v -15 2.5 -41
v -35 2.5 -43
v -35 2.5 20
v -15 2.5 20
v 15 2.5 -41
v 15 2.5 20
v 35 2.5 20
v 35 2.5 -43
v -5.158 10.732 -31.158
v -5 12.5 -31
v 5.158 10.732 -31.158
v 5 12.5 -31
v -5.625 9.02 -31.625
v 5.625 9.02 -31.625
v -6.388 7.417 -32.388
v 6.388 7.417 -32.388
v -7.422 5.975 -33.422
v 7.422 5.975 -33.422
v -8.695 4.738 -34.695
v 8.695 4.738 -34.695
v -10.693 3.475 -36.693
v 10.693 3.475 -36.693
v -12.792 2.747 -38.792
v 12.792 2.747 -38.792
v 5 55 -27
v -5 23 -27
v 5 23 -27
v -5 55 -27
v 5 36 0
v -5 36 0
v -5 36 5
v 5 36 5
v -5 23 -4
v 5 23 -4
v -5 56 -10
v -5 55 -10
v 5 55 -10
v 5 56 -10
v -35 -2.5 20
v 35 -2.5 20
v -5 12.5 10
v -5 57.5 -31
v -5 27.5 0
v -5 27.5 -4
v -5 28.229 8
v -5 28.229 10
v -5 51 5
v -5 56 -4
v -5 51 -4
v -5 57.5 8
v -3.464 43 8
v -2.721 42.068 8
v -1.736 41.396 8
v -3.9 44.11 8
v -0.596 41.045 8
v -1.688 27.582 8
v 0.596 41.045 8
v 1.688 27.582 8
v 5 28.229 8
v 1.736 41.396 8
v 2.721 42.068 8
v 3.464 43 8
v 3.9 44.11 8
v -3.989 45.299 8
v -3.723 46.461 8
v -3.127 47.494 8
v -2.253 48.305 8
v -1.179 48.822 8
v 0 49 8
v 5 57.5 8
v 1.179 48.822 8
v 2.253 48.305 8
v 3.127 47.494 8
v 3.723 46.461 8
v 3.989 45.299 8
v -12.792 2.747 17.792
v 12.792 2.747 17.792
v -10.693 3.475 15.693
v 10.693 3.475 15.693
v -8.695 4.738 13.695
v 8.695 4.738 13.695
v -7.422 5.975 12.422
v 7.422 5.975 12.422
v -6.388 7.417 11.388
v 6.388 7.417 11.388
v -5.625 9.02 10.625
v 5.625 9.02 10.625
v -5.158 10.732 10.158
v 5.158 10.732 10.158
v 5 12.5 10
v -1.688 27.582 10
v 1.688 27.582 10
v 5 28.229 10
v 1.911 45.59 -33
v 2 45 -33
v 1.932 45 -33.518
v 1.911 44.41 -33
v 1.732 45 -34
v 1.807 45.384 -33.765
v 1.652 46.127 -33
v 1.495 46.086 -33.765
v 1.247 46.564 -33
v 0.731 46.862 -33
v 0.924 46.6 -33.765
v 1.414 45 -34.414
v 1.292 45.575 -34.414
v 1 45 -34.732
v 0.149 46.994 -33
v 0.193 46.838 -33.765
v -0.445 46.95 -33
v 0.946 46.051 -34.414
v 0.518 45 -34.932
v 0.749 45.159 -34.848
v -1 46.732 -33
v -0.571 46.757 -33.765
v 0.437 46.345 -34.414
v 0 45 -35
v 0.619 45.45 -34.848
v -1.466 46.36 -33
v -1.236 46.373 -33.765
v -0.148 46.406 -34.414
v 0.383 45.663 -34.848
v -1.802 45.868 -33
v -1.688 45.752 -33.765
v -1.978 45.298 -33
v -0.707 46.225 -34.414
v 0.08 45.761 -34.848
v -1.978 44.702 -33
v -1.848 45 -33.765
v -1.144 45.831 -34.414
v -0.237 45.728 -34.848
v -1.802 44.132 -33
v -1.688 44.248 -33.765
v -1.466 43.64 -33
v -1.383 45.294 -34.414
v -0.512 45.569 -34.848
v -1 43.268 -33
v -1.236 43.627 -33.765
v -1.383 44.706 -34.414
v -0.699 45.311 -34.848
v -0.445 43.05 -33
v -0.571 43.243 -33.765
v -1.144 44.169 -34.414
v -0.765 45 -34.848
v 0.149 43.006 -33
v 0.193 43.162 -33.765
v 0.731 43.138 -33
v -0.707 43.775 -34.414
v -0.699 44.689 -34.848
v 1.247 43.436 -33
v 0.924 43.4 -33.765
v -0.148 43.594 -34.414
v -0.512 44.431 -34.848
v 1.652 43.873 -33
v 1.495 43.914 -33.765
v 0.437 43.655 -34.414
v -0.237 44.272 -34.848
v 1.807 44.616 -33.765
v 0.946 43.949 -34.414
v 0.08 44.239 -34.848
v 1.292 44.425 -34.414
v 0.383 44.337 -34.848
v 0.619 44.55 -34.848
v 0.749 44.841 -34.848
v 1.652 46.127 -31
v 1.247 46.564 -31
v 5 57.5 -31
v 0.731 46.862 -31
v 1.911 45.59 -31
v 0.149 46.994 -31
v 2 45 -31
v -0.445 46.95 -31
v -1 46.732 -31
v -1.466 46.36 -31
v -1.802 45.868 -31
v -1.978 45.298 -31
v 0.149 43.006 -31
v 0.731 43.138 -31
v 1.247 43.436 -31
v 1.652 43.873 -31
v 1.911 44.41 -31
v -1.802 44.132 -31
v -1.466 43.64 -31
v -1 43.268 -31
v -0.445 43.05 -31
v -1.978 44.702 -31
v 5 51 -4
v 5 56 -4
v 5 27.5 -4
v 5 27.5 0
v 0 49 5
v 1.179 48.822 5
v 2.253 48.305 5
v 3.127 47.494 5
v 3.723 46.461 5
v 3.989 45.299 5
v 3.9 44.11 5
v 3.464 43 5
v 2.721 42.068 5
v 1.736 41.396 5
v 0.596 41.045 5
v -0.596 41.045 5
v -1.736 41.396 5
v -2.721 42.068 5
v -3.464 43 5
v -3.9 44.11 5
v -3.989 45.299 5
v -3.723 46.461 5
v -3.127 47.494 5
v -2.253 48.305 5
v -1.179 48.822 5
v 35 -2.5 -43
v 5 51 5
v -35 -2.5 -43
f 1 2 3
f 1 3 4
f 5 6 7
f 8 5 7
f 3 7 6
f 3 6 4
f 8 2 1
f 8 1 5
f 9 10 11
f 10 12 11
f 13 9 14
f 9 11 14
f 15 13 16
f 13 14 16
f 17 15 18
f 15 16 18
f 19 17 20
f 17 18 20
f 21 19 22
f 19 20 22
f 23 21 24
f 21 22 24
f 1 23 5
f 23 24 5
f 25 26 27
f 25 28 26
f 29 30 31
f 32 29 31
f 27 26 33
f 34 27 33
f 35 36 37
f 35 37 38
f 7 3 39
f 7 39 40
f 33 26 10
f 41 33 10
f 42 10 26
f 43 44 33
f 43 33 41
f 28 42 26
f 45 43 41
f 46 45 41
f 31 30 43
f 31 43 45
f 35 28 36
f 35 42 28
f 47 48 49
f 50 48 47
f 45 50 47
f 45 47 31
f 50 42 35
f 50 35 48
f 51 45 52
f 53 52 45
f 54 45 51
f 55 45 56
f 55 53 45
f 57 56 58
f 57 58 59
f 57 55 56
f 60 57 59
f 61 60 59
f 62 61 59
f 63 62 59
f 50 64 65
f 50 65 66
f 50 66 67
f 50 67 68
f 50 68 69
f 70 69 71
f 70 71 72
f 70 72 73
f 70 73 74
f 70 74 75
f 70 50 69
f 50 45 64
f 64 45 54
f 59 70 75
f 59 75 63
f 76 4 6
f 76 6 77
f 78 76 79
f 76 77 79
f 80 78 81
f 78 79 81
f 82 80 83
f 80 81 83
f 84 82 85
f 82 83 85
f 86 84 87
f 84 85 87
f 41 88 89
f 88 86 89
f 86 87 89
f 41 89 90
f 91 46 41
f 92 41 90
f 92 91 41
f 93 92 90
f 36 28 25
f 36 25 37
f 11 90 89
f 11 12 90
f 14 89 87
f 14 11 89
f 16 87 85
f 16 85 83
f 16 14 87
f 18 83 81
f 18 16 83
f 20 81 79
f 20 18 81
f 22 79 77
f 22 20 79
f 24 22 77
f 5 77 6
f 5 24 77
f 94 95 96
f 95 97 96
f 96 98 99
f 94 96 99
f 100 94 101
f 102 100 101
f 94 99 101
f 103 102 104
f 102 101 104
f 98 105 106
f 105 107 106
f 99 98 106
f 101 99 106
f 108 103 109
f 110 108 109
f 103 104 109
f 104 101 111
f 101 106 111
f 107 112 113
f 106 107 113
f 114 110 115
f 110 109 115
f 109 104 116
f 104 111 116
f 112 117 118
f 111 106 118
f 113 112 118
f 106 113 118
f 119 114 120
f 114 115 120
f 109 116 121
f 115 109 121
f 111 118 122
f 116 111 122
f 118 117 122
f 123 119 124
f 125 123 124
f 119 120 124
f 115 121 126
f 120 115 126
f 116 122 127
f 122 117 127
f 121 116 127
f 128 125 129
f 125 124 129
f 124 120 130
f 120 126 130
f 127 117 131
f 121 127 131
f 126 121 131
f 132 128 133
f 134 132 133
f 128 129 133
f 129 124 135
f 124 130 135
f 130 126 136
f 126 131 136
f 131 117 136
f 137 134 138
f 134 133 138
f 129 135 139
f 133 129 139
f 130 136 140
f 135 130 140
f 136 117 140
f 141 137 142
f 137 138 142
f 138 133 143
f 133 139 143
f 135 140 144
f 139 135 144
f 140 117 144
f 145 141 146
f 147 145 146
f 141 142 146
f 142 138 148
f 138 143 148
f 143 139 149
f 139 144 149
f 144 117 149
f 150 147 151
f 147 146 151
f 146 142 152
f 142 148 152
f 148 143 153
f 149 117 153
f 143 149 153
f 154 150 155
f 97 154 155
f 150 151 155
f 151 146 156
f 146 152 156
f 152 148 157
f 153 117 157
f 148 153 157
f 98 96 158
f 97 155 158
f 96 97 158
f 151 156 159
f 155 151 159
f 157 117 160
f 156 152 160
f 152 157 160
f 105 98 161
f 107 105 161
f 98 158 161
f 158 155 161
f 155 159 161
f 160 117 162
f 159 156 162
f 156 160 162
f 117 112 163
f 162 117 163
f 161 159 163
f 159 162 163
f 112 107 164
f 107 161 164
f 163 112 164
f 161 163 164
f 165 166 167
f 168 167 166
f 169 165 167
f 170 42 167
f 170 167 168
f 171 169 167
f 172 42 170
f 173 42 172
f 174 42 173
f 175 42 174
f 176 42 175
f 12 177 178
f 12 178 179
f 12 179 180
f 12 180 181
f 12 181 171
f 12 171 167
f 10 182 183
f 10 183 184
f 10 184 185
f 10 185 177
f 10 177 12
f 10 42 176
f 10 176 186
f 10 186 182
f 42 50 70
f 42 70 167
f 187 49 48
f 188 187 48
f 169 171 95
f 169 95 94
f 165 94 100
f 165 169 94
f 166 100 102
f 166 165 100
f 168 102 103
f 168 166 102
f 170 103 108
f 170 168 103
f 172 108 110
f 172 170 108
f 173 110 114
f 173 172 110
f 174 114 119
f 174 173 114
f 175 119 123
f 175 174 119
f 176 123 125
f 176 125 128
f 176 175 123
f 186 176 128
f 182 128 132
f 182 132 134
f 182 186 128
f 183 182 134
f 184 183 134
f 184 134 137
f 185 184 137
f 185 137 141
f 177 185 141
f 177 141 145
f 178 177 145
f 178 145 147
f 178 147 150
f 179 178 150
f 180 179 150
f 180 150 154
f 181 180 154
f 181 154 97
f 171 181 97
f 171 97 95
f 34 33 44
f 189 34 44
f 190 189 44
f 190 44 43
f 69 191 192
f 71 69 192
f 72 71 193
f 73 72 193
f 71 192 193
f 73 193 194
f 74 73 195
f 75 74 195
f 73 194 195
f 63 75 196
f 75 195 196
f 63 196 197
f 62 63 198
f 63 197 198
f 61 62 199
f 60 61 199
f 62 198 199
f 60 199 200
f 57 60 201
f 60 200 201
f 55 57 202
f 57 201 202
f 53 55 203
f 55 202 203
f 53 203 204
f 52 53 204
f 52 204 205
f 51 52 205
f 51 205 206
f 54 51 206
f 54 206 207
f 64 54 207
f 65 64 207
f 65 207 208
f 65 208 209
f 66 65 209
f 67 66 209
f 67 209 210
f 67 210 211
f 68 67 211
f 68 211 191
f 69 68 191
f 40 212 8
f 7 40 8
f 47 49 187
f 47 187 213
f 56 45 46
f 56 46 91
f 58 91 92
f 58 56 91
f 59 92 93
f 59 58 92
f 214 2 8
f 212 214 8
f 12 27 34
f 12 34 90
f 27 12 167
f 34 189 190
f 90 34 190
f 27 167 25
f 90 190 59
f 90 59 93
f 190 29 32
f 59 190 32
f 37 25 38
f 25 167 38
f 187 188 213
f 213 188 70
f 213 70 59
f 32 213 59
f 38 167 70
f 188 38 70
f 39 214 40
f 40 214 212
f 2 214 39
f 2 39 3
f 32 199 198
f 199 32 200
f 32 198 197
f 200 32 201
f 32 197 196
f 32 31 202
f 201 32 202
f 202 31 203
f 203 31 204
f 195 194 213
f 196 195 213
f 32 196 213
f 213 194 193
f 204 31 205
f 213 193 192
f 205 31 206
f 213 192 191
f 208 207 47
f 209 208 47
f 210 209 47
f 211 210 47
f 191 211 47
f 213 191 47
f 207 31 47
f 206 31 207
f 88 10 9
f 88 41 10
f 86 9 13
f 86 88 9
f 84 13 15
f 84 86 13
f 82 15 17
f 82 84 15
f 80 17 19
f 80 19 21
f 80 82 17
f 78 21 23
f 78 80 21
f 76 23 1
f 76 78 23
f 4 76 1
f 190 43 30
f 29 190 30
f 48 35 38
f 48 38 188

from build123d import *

# Parameters (mm, degrees)
BOSS_EXTRUDE1_DEPTH      = 20
BOSS_EXTRUDE1_DEPTH_BACK = 43
SKETCH1_W                = 70
SKETCH1_H                = 5
BOSS_EXTRUDE2_DEPTH      = 10
BOSS_EXTRUDE2_DEPTH_BACK = 10
SKETCH2_W                = 10
SKETCH2_H                = 55
CUT_EXTRUDE2_DEPTH       = 10
CUT_EXTRUDE2_DEPTH_BACK  = 2
SKETCH4_R                = 1.25
SKETCH5_R                = 1.25
CUT_EXTRUDE3_DEPTH       = 20
CUT_EXTRUDE4_REACH       = 84.19
SKETCH6_W                = 3
SKETCH6_H                = 6
SKETCH6_H_2              = 17.5
SKETCH6_W_2              = 4
SKETCH6_H_3              = 5
SKETCH6_H_4              = 4.5
SKETCH6_W_3              = 5
SKETCH6_H_5              = 9
SKETCH6_W_4              = 13
SKETCH7_R                = 4
CUT_EXTRUDE5_DEPTH       = 6
SKETCH8_W                = 4
SKETCH8_H                = 15
SKETCH8_W_2              = 17
SKETCH8_H_2              = 20.5
BOSS_EXTRUDE3_DEPTH      = 10
SKETCH9_R                = 2
BOSS_EXTRUDE4_DEPTH      = 8
FILLET2_R                = 2
FILLET1_R                = 10


with BuildPart() as part:
    # Sketch1 → Boss-Extrude1 (new, two sides: drawn at the far end of the back side and taken through both)
    with BuildSketch(Plane.XY.offset(-BOSS_EXTRUDE1_DEPTH_BACK)):
        Rectangle(SKETCH1_W, SKETCH1_H)
    extrude(amount=BOSS_EXTRUDE1_DEPTH + BOSS_EXTRUDE1_DEPTH_BACK)

    # Sketch2 → Boss-Extrude2 (add, two sides: drawn at the far end of the back side and taken through both)
    with BuildSketch(Plane.XY.offset(-BOSS_EXTRUDE2_DEPTH_BACK)):
        with Locations((0, 30)):
            Rectangle(SKETCH2_W, SKETCH2_H)
    extrude(amount=BOSS_EXTRUDE2_DEPTH + BOSS_EXTRUDE2_DEPTH_BACK)

    # Sketch4 → Cut-Extrude2 (cut, two sides: drawn at the far end of the back side and taken through both)
    # profile 1 of 2: a face of its own
    with BuildSketch(Plane.XY.offset(10).offset(-CUT_EXTRUDE2_DEPTH_BACK)):
        with BuildLine():
            ThreePointArc((5, 28.229490169), (14.0312152, 34.541749668), (17.5, 45))
            ThreePointArc((17.5, 45), (-10.458250332, 59.0312152), (-5, 28.229490169))
            Line((-5, 28.229490169), (-5, 57.5))
            Line((-5, 57.5), (5, 57.5))
            Line((5, 57.5), (5, 28.229490169))
        make_face()
    # profile 2 of 2: a face of its own
    with BuildSketch(Plane.XY.offset(10).offset(-CUT_EXTRUDE2_DEPTH_BACK)):
        with BuildLine():
            Line((-5, 57.5), (-5, 28.229490169))
            ThreePointArc((-5, 28.229490169), (0, 27.5), (5, 28.229490169))
            Line((5, 28.229490169), (5, 57.5))
            Line((5, 57.5), (-5, 57.5))
        make_face()
        with Locations((0, 45)):
            Circle(SKETCH4_R, mode=Mode.SUBTRACT)
    extrude(amount=CUT_EXTRUDE2_DEPTH + CUT_EXTRUDE2_DEPTH_BACK, mode=Mode.SUBTRACT)

    # Sketch5 → Cut-Extrude3 (cut)
    with BuildSketch(Plane.XY.offset(10)):
        with Locations((0, 45)):
            Circle(SKETCH5_R)
    extrude(amount=-CUT_EXTRUDE3_DEPTH, mode=Mode.SUBTRACT)

    # Cut-Extrude4: up to this face of the body (flat: up to its plane)
    cut_extrude4_end = Plane(part.part.faces().sort_by_distance((5, 29.276865139, -0.505895275))[0])
    # Sketch6 → Cut-Extrude4 (cut, up to the picked face)
    with BuildSketch(Plane.ZY.offset(5), mode=Mode.PRIVATE) as cut_extrude4_sk1:
        with Locations((-5.5, 48)):
            Rectangle(SKETCH6_W, SKETCH6_H)
    cut_extrude4_tool1 = split(extrude(cut_extrude4_sk1.sketch, amount=-CUT_EXTRUDE4_REACH, mode=Mode.PRIVATE), bisect_by=cut_extrude4_end, keep=Keep.BOTH, mode=Mode.PRIVATE)
    # Sketch6 → Cut-Extrude4 (cut, up to the picked face)
    with BuildSketch(Plane.ZY.offset(5), mode=Mode.PRIVATE) as cut_extrude4_sk2:
        Polygon((-7, 27.5), (-7, 45), (-7, 51), (-23, 51), (-23, 27.5), (-10, 27.5), align=None)
    cut_extrude4_tool2 = split(extrude(cut_extrude4_sk2.sketch, amount=-CUT_EXTRUDE4_REACH, mode=Mode.PRIVATE), bisect_by=cut_extrude4_end, keep=Keep.BOTH, mode=Mode.PRIVATE)
    # Sketch6 → Cut-Extrude4 (cut, up to the picked face)
    with BuildSketch(Plane.ZY.offset(5), mode=Mode.PRIVATE) as cut_extrude4_sk3:
        with Locations((-5.5, 36.25)):
            Rectangle(SKETCH6_W, SKETCH6_H_2)
    cut_extrude4_tool3 = split(extrude(cut_extrude4_sk3.sketch, amount=-CUT_EXTRUDE4_REACH, mode=Mode.PRIVATE), bisect_by=cut_extrude4_end, keep=Keep.BOTH, mode=Mode.PRIVATE)
    # Sketch6 → Cut-Extrude4 (cut, up to the picked face)
    with BuildSketch(Plane.ZY.offset(5), mode=Mode.PRIVATE) as cut_extrude4_sk4:
        with Locations((-2, 48)):
            Rectangle(SKETCH6_W_2, SKETCH6_H)
    cut_extrude4_tool4 = split(extrude(cut_extrude4_sk4.sketch, amount=-CUT_EXTRUDE4_REACH, mode=Mode.PRIVATE), bisect_by=cut_extrude4_end, keep=Keep.BOTH, mode=Mode.PRIVATE)
    # Sketch6 → Cut-Extrude4 (cut, up to the picked face)
    with BuildSketch(Plane.ZY.offset(5), mode=Mode.PRIVATE) as cut_extrude4_sk5:
        Polygon((0, 45), (-4, 45), (-4, 27.5), (0, 27.5), (0, 36), align=None)
    cut_extrude4_tool5 = split(extrude(cut_extrude4_sk5.sketch, amount=-CUT_EXTRUDE4_REACH, mode=Mode.PRIVATE), bisect_by=cut_extrude4_end, keep=Keep.BOTH, mode=Mode.PRIVATE)
    # Sketch6 → Cut-Extrude4 (cut, up to the picked face)
    with BuildSketch(Plane.ZY.offset(5), mode=Mode.PRIVATE) as cut_extrude4_sk6:
        with Locations((-5.5, 53.5)):
            Rectangle(SKETCH6_W, SKETCH6_H_3)
    cut_extrude4_tool6 = split(extrude(cut_extrude4_sk6.sketch, amount=-CUT_EXTRUDE4_REACH, mode=Mode.PRIVATE), bisect_by=cut_extrude4_end, keep=Keep.BOTH, mode=Mode.PRIVATE)
    # Sketch6 → Cut-Extrude4 (cut, up to the picked face)
    with BuildSketch(Plane.ZY.offset(5), mode=Mode.PRIVATE) as cut_extrude4_sk7:
        Polygon((-23, 51), (-7, 51), (-7, 56), (-10, 56), (-23, 56), align=None)
    cut_extrude4_tool7 = split(extrude(cut_extrude4_sk7.sketch, amount=-CUT_EXTRUDE4_REACH, mode=Mode.PRIVATE), bisect_by=cut_extrude4_end, keep=Keep.BOTH, mode=Mode.PRIVATE)
    # Sketch6 → Cut-Extrude4 (cut, up to the picked face)
    with BuildSketch(Plane.ZY.offset(5), mode=Mode.PRIVATE) as cut_extrude4_sk8:
        with Locations((-8.5, 25.25)):
            Rectangle(SKETCH6_W, SKETCH6_H_4)
    cut_extrude4_tool8 = split(extrude(cut_extrude4_sk8.sketch, amount=-CUT_EXTRUDE4_REACH, mode=Mode.PRIVATE), bisect_by=cut_extrude4_end, keep=Keep.BOTH, mode=Mode.PRIVATE)
    # Sketch6 → Cut-Extrude4 (cut, up to the picked face)
    with BuildSketch(Plane.ZY.offset(5), mode=Mode.PRIVATE) as cut_extrude4_sk9:
        with Locations((-5.5, 25.25)):
            Rectangle(SKETCH6_W, SKETCH6_H_4)
    cut_extrude4_tool9 = split(extrude(cut_extrude4_sk9.sketch, amount=-CUT_EXTRUDE4_REACH, mode=Mode.PRIVATE), bisect_by=cut_extrude4_end, keep=Keep.BOTH, mode=Mode.PRIVATE)
    # Sketch6 → Cut-Extrude4 (cut, up to the picked face)
    with BuildSketch(Plane.ZY.offset(5), mode=Mode.PRIVATE) as cut_extrude4_sk10:
        with Locations((2.5, 48)):
            Rectangle(SKETCH6_W_3, SKETCH6_H)
    cut_extrude4_tool10 = split(extrude(cut_extrude4_sk10.sketch, amount=-CUT_EXTRUDE4_REACH, mode=Mode.PRIVATE), bisect_by=cut_extrude4_end, keep=Keep.BOTH, mode=Mode.PRIVATE)
    # Sketch6 → Cut-Extrude4 (cut, up to the picked face)
    with BuildSketch(Plane.ZY.offset(5), mode=Mode.PRIVATE) as cut_extrude4_sk11:
        with Locations((2.5, 40.5)):
            Rectangle(SKETCH6_W_3, SKETCH6_H_5)
    cut_extrude4_tool11 = split(extrude(cut_extrude4_sk11.sketch, amount=-CUT_EXTRUDE4_REACH, mode=Mode.PRIVATE), bisect_by=cut_extrude4_end, keep=Keep.BOTH, mode=Mode.PRIVATE)
    # Sketch6 → Cut-Extrude4 (cut, up to the picked face)
    with BuildSketch(Plane.ZY.offset(5), mode=Mode.PRIVATE) as cut_extrude4_sk12:
        with Locations((-16.5, 25.25)):
            Rectangle(SKETCH6_W_4, SKETCH6_H_4)
    cut_extrude4_tool12 = split(extrude(cut_extrude4_sk12.sketch, amount=-CUT_EXTRUDE4_REACH, mode=Mode.PRIVATE), bisect_by=cut_extrude4_end, keep=Keep.BOTH, mode=Mode.PRIVATE)
    add(cut_extrude4_tool1.solids().sort_by(Axis((-5, 48, -5.5), (1, 0, 0)))[0], mode=Mode.SUBTRACT)
    add(cut_extrude4_tool2.solids().sort_by(Axis((-5, 39.25, -15), (1, 0, 0)))[0], mode=Mode.SUBTRACT)
    add(cut_extrude4_tool3.solids().sort_by(Axis((-5, 36.25, -5.5), (1, 0, 0)))[0], mode=Mode.SUBTRACT)
    add(cut_extrude4_tool4.solids().sort_by(Axis((-5, 48, -2), (1, 0, 0)))[0], mode=Mode.SUBTRACT)
    add(cut_extrude4_tool5.solids().sort_by(Axis((-5, 36.25, -2), (1, 0, 0)))[0], mode=Mode.SUBTRACT)
    add(cut_extrude4_tool6.solids().sort_by(Axis((-5, 53.5, -5.5), (1, 0, 0)))[0], mode=Mode.SUBTRACT)
    add(cut_extrude4_tool7.solids().sort_by(Axis((-5, 53.5, -15), (1, 0, 0)))[0], mode=Mode.SUBTRACT)
    add(cut_extrude4_tool8.solids().sort_by(Axis((-5, 25.25, -8.5), (1, 0, 0)))[0], mode=Mode.SUBTRACT)
    add(cut_extrude4_tool9.solids().sort_by(Axis((-5, 25.25, -5.5), (1, 0, 0)))[0], mode=Mode.SUBTRACT)
    add(cut_extrude4_tool10.solids().sort_by(Axis((-5, 48, 2.5), (1, 0, 0)))[0], mode=Mode.SUBTRACT)
    add(cut_extrude4_tool11.solids().sort_by(Axis((-5, 40.5, 2.5), (1, 0, 0)))[0], mode=Mode.SUBTRACT)
    add(cut_extrude4_tool12.solids().sort_by(Axis((-5, 25.25, -16.5), (1, 0, 0)))[0], mode=Mode.SUBTRACT)

    # Sketch7 → Cut-Extrude5 (cut)
    with BuildSketch(Plane(origin=(0, 0, 5), x_dir=(-1, 0, 0), z_dir=(0, 0, -1))):
        with Locations(Location((0, 45, 0), (0, 0, 90))):
            Circle(SKETCH7_R)
    extrude(amount=-CUT_EXTRUDE5_DEPTH, mode=Mode.SUBTRACT)

    # Sketch8 → Boss-Extrude3 (add)
    with BuildSketch(Plane.ZY.offset(5)):
        Polygon((-10, 55), (-10, 57.5), (-31, 57.5), (-31, 55), (-27, 55), align=None)
        with Locations((-29, 47.5)):
            Rectangle(SKETCH8_W, SKETCH8_H)
        Polygon((-27, 40), (-31, 40), (-31, 2.5), (-27, 2.5), (-27, 23), align=None)
        with Locations((-18.5, 12.75)):
            Rectangle(SKETCH8_W_2, SKETCH8_H_2)
    extrude(amount=-BOSS_EXTRUDE3_DEPTH)

    # Sketch9 → Boss-Extrude4 (add)
    with BuildSketch(Plane.XY.offset(-27)):
        with Locations((0, 45)):
            Circle(SKETCH9_R)
    extrude(amount=-BOSS_EXTRUDE4_DEPTH)

    # Fillet2
    fillet2_edges = [part.edges().sort_by_distance(p)[0] for p in [
        (-2, 45, -35),
    ]]
    fillet(fillet2_edges, radius=FILLET2_R)

    # Fillet1
    fillet1_edges = [part.edges().sort_by_distance(p)[0] for p in [
        (0, 2.5, -31),
        (5, 2.5, -10.5),
        (-5, 2.5, -10.5),
        (0, 2.5, 10),
    ]]
    fillet(fillet1_edges, radius=FILLET1_R - 0.0001)  # a hair under: the kernel refuses the full size


solid = part.part
